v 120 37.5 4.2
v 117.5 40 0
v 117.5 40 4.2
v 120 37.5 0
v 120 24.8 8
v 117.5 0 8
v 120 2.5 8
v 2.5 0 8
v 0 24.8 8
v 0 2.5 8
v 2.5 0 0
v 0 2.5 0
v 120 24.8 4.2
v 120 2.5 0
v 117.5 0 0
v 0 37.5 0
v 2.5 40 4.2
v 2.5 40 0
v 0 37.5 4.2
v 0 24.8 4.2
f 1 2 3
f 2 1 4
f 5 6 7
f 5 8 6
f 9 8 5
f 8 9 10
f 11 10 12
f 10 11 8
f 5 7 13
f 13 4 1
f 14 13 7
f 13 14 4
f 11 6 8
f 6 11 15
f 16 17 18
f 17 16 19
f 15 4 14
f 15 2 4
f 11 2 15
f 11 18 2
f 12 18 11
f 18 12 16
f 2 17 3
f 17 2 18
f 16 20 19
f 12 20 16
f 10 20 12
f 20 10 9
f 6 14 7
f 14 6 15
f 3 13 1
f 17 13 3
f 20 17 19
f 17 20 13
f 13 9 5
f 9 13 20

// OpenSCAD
$fn = 32;
// target_bbox: 120, 40, 8
// ----------------------------------------------------------------------
// Stepped bar: sidestep, 120 x 40 x 8/4.2 mm
// ----------------------------------------------------------------------

// --- parameters (mm) ---
bar_l = 120;              // bar length, X
bar_w = 40;               // bar width, Y
plate_t = 8;              // thickness of the thick zone, Z
thin_t = 4.2;             // thickness of the thin zone
corner_c = 2.5;           // corner chamfer of the bar
step_cut = 3.8;           // material removed from the thin zone
ledge_y = 24.8;           // start of the ledge from the front edge
depth_1 = 3.8;            // depth of cut 1 from the top face

profile = [[2.5, 0], [117.5, 0], [120, 2.5], [120, 37.5], [117.5, 40], [2.5, 40], [0, 37.5], [0, 2.5]];  // primary outline, 8 points, counter clockwise
void_1 = [[-1, 24.8], [121, 24.8], [121, 41], [-1, 41]];  // ledge cut along one edge, 4 points

// --- the one profile operation ---
difference() {
  linear_extrude(height = plate_t) polygon(points = profile);
  translate([0, 0, plate_t - depth_1])
    linear_extrude(height = depth_1 + 1) polygon(points = void_1);
}
